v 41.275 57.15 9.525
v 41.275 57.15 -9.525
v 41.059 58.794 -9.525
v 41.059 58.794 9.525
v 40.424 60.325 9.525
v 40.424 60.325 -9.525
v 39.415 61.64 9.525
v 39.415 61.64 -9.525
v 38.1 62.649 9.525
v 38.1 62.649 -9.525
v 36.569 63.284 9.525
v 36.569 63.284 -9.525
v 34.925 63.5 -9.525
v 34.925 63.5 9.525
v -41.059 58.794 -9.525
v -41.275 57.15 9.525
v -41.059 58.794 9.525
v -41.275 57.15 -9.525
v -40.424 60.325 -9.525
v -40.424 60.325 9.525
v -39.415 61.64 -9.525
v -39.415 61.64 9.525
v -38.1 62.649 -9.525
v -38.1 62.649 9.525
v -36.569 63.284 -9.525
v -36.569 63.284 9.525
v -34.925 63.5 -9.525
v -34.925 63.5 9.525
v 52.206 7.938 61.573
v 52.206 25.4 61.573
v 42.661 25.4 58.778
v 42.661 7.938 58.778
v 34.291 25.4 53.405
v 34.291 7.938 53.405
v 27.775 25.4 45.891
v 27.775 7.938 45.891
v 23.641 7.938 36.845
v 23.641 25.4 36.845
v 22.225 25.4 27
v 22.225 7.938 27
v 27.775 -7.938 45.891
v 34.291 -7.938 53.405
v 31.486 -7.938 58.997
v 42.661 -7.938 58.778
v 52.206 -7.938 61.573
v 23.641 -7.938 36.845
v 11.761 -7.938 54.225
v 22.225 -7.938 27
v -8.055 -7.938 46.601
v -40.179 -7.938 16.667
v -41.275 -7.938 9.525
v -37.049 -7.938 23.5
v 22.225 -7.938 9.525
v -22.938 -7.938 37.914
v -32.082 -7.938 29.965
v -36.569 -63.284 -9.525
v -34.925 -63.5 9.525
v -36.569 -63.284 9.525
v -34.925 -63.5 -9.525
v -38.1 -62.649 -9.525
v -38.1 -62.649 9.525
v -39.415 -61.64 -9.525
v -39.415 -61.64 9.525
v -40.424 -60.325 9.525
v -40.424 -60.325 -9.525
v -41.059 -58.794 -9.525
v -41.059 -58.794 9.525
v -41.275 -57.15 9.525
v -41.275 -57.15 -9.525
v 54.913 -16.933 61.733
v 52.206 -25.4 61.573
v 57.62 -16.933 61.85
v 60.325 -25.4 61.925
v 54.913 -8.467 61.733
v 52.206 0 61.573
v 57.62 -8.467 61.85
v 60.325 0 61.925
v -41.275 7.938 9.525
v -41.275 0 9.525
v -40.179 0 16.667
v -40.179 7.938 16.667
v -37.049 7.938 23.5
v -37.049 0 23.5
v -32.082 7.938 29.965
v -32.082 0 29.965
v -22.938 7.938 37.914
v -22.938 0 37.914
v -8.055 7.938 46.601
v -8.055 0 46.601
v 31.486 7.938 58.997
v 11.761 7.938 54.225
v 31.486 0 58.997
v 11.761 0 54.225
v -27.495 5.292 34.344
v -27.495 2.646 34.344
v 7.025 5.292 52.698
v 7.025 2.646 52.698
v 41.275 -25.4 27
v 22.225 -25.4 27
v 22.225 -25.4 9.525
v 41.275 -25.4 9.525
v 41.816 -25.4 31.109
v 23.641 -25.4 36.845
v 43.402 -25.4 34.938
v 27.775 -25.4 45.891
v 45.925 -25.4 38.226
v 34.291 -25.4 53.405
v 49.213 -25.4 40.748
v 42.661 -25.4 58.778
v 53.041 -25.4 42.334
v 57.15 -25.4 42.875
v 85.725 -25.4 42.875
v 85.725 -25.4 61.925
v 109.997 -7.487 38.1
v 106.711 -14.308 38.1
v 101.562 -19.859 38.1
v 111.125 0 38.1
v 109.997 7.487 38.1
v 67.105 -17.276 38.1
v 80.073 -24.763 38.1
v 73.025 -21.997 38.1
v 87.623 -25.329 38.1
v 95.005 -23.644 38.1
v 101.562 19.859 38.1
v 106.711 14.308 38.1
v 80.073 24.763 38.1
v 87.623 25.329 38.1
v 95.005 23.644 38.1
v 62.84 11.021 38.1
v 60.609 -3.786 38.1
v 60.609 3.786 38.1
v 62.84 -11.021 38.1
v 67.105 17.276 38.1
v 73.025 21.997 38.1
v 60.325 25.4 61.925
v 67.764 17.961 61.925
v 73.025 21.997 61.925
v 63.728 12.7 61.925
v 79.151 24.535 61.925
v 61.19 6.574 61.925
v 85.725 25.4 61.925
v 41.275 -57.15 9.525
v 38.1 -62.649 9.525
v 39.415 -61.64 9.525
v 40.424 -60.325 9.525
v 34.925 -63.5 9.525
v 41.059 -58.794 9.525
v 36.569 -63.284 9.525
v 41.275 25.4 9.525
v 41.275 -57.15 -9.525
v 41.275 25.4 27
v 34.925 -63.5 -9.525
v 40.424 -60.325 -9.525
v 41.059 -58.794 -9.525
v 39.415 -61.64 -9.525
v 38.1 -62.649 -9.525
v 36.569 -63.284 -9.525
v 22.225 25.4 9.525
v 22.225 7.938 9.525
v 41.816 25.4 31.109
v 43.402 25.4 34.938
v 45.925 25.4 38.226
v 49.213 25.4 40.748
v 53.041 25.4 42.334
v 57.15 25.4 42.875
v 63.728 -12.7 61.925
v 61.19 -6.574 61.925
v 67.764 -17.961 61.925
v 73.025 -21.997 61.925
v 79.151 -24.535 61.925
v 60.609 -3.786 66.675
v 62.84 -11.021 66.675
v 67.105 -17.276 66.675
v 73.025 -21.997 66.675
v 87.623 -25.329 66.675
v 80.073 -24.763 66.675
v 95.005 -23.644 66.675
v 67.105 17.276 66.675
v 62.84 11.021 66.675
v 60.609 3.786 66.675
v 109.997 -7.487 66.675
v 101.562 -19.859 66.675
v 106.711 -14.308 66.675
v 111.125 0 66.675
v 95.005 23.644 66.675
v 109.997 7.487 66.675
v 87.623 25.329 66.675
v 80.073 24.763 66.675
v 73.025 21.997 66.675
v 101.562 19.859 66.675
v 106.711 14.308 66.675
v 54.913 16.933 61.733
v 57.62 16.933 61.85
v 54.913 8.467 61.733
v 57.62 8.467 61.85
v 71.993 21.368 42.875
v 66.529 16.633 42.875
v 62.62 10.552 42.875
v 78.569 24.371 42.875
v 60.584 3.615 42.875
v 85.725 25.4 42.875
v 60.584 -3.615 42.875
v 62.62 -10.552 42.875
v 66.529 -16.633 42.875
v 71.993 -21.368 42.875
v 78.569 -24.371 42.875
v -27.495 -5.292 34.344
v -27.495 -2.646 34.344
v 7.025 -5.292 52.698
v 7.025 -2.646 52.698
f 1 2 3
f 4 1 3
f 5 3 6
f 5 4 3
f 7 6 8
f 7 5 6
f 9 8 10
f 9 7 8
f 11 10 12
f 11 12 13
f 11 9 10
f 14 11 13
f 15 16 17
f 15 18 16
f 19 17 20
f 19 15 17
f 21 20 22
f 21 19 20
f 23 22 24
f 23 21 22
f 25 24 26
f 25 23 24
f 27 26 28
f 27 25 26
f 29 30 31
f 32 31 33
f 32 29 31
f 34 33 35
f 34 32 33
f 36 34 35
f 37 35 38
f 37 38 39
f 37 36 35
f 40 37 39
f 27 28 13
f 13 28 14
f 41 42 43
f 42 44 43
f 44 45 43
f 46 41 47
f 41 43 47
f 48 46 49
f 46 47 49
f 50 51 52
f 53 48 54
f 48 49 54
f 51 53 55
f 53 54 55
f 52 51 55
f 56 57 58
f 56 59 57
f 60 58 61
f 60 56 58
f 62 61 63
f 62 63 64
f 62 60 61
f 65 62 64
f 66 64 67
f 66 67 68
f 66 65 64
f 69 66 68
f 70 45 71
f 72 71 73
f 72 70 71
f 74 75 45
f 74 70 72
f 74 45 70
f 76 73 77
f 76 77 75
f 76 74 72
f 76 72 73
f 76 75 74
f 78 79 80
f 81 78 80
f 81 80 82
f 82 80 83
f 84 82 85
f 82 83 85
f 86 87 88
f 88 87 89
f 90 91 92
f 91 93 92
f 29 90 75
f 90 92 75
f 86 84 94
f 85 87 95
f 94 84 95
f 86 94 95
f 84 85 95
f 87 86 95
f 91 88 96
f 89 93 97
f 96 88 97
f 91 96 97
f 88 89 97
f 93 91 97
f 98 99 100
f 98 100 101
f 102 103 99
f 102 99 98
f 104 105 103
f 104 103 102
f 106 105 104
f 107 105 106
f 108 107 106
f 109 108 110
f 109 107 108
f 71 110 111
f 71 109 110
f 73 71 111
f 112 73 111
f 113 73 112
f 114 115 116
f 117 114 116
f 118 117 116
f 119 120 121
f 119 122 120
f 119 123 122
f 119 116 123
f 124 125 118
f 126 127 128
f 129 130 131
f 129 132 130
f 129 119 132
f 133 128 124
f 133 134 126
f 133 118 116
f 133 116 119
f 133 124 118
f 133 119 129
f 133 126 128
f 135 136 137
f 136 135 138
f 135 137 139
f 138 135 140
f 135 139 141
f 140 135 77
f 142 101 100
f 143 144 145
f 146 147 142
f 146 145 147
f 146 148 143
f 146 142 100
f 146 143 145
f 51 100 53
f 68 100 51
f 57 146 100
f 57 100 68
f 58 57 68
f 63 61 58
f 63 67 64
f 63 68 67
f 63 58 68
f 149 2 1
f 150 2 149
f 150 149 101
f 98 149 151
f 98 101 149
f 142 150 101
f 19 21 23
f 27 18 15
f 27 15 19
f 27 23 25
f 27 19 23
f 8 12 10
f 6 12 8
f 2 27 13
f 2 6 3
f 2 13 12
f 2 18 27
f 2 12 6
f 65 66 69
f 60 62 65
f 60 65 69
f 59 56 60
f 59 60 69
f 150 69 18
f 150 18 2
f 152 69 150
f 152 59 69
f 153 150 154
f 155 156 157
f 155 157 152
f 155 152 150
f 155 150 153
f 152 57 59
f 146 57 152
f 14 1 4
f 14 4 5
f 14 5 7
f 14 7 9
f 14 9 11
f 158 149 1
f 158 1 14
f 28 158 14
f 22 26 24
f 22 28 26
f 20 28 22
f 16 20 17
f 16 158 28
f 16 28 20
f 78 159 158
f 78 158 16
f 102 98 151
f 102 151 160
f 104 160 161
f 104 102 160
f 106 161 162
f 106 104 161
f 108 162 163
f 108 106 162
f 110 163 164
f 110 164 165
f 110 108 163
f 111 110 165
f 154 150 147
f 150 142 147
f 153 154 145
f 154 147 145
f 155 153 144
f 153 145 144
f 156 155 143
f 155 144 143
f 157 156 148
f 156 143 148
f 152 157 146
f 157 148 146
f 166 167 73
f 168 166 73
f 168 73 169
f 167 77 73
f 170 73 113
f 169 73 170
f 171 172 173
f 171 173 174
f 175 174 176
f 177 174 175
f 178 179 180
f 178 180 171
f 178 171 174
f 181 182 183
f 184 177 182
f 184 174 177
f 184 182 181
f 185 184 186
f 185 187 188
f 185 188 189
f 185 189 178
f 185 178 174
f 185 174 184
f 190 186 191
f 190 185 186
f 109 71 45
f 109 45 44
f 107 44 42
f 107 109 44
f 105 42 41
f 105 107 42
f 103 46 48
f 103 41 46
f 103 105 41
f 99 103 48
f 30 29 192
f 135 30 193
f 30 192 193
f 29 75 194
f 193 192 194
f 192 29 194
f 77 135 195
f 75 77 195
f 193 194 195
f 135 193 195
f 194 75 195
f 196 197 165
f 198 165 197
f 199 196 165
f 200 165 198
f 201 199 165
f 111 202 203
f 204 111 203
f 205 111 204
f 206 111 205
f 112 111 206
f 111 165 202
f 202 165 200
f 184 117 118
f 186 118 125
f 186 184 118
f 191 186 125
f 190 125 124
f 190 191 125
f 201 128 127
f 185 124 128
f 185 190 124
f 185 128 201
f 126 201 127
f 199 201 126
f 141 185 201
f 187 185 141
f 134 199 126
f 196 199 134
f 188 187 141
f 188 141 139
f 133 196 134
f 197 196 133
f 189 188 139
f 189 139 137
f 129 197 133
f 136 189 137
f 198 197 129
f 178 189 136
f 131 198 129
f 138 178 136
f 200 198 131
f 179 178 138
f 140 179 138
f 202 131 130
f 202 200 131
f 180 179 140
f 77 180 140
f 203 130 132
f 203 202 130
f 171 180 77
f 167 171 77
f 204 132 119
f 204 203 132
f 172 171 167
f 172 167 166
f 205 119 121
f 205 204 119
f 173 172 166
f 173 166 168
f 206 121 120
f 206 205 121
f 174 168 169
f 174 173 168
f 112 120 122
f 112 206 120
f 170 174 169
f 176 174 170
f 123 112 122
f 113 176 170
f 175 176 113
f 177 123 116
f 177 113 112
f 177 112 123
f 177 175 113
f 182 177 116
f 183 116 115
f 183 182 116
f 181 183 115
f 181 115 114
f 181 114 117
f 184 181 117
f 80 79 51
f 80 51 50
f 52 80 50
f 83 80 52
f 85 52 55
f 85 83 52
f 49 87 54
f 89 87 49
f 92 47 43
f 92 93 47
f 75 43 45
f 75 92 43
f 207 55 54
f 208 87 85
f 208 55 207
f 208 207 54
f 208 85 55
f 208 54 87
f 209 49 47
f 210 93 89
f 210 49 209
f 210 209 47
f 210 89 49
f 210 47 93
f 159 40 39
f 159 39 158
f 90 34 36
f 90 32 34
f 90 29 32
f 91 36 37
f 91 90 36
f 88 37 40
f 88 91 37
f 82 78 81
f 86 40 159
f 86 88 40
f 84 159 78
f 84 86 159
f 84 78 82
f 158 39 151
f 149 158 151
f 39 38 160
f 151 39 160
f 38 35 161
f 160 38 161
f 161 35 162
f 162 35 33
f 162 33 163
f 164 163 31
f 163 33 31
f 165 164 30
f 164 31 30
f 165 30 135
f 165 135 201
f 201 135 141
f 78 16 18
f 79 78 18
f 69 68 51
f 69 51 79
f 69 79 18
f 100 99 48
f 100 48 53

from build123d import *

# Parameters (mm, degrees)
F1_DEPTH = 63.5
F2_DEPTH = 25.4
F3_DEPTH = 7.9375
F0_W     = 25.4
F0_H     = 19.05
F4_DEPTH = 25.4
F6_R     = 6.35


with BuildPart() as f1:
    # F0 (on Front) → F1 (new body, symmetric)
    with BuildSketch(Plane.XZ):
        Polygon((-41.275, 9.525), (-41.275, -9.525), (41.275, -9.525), (41.275, 9.525), (22.225, 9.525), align=None)
    extrude(amount=F1_DEPTH, both=True)

    # F0 (on Front) → F2 (join, symmetric)
    with BuildSketch(Plane.XZ):
        with BuildLine():
            Line((22.225, 9.525), (41.275, 9.525))
            Line((41.275, 9.525), (41.275, 27.0002))
            ThreePointArc((41.275, 27.0002), (45.92468, 38.22552), (57.15, 42.8752))
            Line((57.15, 42.8752), (60.325, 42.8752))
            Line((60.325, 42.8752), (60.325, 61.9252))
            add(Edge.make_bspline(
                [(52.205815, 61.573465), (54.9122, 61.753284), (57.621454, 61.871383), (60.325, 61.9252)],
                knots=[108.111477, 108.111477, 108.111477, 108.111477, 114.316845, 114.316845, 114.316845, 114.316845], degree=3))
            ThreePointArc((52.205815, 61.573465), (30.764101, 49.881196), (22.225, 27.0002))
            Line((22.225, 27.0002), (22.225, 9.525))
        make_face()
    extrude(amount=F2_DEPTH, both=True)

    # F0 (on Front) → F3 (join, symmetric)
    with BuildSketch(Plane.XZ):
        with BuildLine():
            add(Edge.make_bspline(
                [(-41.275, 9.525), (-41.22588, 36.57363), (5.054491, 58.440611), (52.205815, 61.573465)],
                knots=[0, 0, 0, 0, 108.111477, 108.111477, 108.111477, 108.111477], degree=3))
            Line((-41.275, 9.525), (22.225, 9.525))
            Line((22.225, 9.525), (22.225, 27.0002))
            ThreePointArc((22.225, 27.0002), (30.764101, 49.881196), (52.205815, 61.573465))
        make_face()
    extrude(amount=F3_DEPTH, both=True)

    # F0 (on Front) → F4 (join, symmetric)
    with BuildSketch(Plane.XZ):
        with Locations((73.025, 52.4002)):
            Rectangle(F0_W, F0_H)
    extrude(amount=F4_DEPTH, both=True)

    # F0 (on Front) → F5 (revolve)
    with BuildSketch(Plane.XZ):
        Polygon((85.725, 66.675), (85.725, 61.9252), (85.725, 42.8752), (85.725, 38.1), (111.125, 38.1), (111.125, 66.675), align=None)
    revolve(axis=Axis((85.725, 0, 52.3875), (0, 0, 1)))

    # F6
    f6_edges = [f1.edges().sort_by_distance(p)[0] for p in [
        (41.275, -63.5, 0),
        (-41.275, -63.5, 0),
        (41.275, 63.5, 0),
        (-41.275, 63.5, 0),
    ]]
    fillet(f6_edges, radius=F6_R)


solid = f1.part
